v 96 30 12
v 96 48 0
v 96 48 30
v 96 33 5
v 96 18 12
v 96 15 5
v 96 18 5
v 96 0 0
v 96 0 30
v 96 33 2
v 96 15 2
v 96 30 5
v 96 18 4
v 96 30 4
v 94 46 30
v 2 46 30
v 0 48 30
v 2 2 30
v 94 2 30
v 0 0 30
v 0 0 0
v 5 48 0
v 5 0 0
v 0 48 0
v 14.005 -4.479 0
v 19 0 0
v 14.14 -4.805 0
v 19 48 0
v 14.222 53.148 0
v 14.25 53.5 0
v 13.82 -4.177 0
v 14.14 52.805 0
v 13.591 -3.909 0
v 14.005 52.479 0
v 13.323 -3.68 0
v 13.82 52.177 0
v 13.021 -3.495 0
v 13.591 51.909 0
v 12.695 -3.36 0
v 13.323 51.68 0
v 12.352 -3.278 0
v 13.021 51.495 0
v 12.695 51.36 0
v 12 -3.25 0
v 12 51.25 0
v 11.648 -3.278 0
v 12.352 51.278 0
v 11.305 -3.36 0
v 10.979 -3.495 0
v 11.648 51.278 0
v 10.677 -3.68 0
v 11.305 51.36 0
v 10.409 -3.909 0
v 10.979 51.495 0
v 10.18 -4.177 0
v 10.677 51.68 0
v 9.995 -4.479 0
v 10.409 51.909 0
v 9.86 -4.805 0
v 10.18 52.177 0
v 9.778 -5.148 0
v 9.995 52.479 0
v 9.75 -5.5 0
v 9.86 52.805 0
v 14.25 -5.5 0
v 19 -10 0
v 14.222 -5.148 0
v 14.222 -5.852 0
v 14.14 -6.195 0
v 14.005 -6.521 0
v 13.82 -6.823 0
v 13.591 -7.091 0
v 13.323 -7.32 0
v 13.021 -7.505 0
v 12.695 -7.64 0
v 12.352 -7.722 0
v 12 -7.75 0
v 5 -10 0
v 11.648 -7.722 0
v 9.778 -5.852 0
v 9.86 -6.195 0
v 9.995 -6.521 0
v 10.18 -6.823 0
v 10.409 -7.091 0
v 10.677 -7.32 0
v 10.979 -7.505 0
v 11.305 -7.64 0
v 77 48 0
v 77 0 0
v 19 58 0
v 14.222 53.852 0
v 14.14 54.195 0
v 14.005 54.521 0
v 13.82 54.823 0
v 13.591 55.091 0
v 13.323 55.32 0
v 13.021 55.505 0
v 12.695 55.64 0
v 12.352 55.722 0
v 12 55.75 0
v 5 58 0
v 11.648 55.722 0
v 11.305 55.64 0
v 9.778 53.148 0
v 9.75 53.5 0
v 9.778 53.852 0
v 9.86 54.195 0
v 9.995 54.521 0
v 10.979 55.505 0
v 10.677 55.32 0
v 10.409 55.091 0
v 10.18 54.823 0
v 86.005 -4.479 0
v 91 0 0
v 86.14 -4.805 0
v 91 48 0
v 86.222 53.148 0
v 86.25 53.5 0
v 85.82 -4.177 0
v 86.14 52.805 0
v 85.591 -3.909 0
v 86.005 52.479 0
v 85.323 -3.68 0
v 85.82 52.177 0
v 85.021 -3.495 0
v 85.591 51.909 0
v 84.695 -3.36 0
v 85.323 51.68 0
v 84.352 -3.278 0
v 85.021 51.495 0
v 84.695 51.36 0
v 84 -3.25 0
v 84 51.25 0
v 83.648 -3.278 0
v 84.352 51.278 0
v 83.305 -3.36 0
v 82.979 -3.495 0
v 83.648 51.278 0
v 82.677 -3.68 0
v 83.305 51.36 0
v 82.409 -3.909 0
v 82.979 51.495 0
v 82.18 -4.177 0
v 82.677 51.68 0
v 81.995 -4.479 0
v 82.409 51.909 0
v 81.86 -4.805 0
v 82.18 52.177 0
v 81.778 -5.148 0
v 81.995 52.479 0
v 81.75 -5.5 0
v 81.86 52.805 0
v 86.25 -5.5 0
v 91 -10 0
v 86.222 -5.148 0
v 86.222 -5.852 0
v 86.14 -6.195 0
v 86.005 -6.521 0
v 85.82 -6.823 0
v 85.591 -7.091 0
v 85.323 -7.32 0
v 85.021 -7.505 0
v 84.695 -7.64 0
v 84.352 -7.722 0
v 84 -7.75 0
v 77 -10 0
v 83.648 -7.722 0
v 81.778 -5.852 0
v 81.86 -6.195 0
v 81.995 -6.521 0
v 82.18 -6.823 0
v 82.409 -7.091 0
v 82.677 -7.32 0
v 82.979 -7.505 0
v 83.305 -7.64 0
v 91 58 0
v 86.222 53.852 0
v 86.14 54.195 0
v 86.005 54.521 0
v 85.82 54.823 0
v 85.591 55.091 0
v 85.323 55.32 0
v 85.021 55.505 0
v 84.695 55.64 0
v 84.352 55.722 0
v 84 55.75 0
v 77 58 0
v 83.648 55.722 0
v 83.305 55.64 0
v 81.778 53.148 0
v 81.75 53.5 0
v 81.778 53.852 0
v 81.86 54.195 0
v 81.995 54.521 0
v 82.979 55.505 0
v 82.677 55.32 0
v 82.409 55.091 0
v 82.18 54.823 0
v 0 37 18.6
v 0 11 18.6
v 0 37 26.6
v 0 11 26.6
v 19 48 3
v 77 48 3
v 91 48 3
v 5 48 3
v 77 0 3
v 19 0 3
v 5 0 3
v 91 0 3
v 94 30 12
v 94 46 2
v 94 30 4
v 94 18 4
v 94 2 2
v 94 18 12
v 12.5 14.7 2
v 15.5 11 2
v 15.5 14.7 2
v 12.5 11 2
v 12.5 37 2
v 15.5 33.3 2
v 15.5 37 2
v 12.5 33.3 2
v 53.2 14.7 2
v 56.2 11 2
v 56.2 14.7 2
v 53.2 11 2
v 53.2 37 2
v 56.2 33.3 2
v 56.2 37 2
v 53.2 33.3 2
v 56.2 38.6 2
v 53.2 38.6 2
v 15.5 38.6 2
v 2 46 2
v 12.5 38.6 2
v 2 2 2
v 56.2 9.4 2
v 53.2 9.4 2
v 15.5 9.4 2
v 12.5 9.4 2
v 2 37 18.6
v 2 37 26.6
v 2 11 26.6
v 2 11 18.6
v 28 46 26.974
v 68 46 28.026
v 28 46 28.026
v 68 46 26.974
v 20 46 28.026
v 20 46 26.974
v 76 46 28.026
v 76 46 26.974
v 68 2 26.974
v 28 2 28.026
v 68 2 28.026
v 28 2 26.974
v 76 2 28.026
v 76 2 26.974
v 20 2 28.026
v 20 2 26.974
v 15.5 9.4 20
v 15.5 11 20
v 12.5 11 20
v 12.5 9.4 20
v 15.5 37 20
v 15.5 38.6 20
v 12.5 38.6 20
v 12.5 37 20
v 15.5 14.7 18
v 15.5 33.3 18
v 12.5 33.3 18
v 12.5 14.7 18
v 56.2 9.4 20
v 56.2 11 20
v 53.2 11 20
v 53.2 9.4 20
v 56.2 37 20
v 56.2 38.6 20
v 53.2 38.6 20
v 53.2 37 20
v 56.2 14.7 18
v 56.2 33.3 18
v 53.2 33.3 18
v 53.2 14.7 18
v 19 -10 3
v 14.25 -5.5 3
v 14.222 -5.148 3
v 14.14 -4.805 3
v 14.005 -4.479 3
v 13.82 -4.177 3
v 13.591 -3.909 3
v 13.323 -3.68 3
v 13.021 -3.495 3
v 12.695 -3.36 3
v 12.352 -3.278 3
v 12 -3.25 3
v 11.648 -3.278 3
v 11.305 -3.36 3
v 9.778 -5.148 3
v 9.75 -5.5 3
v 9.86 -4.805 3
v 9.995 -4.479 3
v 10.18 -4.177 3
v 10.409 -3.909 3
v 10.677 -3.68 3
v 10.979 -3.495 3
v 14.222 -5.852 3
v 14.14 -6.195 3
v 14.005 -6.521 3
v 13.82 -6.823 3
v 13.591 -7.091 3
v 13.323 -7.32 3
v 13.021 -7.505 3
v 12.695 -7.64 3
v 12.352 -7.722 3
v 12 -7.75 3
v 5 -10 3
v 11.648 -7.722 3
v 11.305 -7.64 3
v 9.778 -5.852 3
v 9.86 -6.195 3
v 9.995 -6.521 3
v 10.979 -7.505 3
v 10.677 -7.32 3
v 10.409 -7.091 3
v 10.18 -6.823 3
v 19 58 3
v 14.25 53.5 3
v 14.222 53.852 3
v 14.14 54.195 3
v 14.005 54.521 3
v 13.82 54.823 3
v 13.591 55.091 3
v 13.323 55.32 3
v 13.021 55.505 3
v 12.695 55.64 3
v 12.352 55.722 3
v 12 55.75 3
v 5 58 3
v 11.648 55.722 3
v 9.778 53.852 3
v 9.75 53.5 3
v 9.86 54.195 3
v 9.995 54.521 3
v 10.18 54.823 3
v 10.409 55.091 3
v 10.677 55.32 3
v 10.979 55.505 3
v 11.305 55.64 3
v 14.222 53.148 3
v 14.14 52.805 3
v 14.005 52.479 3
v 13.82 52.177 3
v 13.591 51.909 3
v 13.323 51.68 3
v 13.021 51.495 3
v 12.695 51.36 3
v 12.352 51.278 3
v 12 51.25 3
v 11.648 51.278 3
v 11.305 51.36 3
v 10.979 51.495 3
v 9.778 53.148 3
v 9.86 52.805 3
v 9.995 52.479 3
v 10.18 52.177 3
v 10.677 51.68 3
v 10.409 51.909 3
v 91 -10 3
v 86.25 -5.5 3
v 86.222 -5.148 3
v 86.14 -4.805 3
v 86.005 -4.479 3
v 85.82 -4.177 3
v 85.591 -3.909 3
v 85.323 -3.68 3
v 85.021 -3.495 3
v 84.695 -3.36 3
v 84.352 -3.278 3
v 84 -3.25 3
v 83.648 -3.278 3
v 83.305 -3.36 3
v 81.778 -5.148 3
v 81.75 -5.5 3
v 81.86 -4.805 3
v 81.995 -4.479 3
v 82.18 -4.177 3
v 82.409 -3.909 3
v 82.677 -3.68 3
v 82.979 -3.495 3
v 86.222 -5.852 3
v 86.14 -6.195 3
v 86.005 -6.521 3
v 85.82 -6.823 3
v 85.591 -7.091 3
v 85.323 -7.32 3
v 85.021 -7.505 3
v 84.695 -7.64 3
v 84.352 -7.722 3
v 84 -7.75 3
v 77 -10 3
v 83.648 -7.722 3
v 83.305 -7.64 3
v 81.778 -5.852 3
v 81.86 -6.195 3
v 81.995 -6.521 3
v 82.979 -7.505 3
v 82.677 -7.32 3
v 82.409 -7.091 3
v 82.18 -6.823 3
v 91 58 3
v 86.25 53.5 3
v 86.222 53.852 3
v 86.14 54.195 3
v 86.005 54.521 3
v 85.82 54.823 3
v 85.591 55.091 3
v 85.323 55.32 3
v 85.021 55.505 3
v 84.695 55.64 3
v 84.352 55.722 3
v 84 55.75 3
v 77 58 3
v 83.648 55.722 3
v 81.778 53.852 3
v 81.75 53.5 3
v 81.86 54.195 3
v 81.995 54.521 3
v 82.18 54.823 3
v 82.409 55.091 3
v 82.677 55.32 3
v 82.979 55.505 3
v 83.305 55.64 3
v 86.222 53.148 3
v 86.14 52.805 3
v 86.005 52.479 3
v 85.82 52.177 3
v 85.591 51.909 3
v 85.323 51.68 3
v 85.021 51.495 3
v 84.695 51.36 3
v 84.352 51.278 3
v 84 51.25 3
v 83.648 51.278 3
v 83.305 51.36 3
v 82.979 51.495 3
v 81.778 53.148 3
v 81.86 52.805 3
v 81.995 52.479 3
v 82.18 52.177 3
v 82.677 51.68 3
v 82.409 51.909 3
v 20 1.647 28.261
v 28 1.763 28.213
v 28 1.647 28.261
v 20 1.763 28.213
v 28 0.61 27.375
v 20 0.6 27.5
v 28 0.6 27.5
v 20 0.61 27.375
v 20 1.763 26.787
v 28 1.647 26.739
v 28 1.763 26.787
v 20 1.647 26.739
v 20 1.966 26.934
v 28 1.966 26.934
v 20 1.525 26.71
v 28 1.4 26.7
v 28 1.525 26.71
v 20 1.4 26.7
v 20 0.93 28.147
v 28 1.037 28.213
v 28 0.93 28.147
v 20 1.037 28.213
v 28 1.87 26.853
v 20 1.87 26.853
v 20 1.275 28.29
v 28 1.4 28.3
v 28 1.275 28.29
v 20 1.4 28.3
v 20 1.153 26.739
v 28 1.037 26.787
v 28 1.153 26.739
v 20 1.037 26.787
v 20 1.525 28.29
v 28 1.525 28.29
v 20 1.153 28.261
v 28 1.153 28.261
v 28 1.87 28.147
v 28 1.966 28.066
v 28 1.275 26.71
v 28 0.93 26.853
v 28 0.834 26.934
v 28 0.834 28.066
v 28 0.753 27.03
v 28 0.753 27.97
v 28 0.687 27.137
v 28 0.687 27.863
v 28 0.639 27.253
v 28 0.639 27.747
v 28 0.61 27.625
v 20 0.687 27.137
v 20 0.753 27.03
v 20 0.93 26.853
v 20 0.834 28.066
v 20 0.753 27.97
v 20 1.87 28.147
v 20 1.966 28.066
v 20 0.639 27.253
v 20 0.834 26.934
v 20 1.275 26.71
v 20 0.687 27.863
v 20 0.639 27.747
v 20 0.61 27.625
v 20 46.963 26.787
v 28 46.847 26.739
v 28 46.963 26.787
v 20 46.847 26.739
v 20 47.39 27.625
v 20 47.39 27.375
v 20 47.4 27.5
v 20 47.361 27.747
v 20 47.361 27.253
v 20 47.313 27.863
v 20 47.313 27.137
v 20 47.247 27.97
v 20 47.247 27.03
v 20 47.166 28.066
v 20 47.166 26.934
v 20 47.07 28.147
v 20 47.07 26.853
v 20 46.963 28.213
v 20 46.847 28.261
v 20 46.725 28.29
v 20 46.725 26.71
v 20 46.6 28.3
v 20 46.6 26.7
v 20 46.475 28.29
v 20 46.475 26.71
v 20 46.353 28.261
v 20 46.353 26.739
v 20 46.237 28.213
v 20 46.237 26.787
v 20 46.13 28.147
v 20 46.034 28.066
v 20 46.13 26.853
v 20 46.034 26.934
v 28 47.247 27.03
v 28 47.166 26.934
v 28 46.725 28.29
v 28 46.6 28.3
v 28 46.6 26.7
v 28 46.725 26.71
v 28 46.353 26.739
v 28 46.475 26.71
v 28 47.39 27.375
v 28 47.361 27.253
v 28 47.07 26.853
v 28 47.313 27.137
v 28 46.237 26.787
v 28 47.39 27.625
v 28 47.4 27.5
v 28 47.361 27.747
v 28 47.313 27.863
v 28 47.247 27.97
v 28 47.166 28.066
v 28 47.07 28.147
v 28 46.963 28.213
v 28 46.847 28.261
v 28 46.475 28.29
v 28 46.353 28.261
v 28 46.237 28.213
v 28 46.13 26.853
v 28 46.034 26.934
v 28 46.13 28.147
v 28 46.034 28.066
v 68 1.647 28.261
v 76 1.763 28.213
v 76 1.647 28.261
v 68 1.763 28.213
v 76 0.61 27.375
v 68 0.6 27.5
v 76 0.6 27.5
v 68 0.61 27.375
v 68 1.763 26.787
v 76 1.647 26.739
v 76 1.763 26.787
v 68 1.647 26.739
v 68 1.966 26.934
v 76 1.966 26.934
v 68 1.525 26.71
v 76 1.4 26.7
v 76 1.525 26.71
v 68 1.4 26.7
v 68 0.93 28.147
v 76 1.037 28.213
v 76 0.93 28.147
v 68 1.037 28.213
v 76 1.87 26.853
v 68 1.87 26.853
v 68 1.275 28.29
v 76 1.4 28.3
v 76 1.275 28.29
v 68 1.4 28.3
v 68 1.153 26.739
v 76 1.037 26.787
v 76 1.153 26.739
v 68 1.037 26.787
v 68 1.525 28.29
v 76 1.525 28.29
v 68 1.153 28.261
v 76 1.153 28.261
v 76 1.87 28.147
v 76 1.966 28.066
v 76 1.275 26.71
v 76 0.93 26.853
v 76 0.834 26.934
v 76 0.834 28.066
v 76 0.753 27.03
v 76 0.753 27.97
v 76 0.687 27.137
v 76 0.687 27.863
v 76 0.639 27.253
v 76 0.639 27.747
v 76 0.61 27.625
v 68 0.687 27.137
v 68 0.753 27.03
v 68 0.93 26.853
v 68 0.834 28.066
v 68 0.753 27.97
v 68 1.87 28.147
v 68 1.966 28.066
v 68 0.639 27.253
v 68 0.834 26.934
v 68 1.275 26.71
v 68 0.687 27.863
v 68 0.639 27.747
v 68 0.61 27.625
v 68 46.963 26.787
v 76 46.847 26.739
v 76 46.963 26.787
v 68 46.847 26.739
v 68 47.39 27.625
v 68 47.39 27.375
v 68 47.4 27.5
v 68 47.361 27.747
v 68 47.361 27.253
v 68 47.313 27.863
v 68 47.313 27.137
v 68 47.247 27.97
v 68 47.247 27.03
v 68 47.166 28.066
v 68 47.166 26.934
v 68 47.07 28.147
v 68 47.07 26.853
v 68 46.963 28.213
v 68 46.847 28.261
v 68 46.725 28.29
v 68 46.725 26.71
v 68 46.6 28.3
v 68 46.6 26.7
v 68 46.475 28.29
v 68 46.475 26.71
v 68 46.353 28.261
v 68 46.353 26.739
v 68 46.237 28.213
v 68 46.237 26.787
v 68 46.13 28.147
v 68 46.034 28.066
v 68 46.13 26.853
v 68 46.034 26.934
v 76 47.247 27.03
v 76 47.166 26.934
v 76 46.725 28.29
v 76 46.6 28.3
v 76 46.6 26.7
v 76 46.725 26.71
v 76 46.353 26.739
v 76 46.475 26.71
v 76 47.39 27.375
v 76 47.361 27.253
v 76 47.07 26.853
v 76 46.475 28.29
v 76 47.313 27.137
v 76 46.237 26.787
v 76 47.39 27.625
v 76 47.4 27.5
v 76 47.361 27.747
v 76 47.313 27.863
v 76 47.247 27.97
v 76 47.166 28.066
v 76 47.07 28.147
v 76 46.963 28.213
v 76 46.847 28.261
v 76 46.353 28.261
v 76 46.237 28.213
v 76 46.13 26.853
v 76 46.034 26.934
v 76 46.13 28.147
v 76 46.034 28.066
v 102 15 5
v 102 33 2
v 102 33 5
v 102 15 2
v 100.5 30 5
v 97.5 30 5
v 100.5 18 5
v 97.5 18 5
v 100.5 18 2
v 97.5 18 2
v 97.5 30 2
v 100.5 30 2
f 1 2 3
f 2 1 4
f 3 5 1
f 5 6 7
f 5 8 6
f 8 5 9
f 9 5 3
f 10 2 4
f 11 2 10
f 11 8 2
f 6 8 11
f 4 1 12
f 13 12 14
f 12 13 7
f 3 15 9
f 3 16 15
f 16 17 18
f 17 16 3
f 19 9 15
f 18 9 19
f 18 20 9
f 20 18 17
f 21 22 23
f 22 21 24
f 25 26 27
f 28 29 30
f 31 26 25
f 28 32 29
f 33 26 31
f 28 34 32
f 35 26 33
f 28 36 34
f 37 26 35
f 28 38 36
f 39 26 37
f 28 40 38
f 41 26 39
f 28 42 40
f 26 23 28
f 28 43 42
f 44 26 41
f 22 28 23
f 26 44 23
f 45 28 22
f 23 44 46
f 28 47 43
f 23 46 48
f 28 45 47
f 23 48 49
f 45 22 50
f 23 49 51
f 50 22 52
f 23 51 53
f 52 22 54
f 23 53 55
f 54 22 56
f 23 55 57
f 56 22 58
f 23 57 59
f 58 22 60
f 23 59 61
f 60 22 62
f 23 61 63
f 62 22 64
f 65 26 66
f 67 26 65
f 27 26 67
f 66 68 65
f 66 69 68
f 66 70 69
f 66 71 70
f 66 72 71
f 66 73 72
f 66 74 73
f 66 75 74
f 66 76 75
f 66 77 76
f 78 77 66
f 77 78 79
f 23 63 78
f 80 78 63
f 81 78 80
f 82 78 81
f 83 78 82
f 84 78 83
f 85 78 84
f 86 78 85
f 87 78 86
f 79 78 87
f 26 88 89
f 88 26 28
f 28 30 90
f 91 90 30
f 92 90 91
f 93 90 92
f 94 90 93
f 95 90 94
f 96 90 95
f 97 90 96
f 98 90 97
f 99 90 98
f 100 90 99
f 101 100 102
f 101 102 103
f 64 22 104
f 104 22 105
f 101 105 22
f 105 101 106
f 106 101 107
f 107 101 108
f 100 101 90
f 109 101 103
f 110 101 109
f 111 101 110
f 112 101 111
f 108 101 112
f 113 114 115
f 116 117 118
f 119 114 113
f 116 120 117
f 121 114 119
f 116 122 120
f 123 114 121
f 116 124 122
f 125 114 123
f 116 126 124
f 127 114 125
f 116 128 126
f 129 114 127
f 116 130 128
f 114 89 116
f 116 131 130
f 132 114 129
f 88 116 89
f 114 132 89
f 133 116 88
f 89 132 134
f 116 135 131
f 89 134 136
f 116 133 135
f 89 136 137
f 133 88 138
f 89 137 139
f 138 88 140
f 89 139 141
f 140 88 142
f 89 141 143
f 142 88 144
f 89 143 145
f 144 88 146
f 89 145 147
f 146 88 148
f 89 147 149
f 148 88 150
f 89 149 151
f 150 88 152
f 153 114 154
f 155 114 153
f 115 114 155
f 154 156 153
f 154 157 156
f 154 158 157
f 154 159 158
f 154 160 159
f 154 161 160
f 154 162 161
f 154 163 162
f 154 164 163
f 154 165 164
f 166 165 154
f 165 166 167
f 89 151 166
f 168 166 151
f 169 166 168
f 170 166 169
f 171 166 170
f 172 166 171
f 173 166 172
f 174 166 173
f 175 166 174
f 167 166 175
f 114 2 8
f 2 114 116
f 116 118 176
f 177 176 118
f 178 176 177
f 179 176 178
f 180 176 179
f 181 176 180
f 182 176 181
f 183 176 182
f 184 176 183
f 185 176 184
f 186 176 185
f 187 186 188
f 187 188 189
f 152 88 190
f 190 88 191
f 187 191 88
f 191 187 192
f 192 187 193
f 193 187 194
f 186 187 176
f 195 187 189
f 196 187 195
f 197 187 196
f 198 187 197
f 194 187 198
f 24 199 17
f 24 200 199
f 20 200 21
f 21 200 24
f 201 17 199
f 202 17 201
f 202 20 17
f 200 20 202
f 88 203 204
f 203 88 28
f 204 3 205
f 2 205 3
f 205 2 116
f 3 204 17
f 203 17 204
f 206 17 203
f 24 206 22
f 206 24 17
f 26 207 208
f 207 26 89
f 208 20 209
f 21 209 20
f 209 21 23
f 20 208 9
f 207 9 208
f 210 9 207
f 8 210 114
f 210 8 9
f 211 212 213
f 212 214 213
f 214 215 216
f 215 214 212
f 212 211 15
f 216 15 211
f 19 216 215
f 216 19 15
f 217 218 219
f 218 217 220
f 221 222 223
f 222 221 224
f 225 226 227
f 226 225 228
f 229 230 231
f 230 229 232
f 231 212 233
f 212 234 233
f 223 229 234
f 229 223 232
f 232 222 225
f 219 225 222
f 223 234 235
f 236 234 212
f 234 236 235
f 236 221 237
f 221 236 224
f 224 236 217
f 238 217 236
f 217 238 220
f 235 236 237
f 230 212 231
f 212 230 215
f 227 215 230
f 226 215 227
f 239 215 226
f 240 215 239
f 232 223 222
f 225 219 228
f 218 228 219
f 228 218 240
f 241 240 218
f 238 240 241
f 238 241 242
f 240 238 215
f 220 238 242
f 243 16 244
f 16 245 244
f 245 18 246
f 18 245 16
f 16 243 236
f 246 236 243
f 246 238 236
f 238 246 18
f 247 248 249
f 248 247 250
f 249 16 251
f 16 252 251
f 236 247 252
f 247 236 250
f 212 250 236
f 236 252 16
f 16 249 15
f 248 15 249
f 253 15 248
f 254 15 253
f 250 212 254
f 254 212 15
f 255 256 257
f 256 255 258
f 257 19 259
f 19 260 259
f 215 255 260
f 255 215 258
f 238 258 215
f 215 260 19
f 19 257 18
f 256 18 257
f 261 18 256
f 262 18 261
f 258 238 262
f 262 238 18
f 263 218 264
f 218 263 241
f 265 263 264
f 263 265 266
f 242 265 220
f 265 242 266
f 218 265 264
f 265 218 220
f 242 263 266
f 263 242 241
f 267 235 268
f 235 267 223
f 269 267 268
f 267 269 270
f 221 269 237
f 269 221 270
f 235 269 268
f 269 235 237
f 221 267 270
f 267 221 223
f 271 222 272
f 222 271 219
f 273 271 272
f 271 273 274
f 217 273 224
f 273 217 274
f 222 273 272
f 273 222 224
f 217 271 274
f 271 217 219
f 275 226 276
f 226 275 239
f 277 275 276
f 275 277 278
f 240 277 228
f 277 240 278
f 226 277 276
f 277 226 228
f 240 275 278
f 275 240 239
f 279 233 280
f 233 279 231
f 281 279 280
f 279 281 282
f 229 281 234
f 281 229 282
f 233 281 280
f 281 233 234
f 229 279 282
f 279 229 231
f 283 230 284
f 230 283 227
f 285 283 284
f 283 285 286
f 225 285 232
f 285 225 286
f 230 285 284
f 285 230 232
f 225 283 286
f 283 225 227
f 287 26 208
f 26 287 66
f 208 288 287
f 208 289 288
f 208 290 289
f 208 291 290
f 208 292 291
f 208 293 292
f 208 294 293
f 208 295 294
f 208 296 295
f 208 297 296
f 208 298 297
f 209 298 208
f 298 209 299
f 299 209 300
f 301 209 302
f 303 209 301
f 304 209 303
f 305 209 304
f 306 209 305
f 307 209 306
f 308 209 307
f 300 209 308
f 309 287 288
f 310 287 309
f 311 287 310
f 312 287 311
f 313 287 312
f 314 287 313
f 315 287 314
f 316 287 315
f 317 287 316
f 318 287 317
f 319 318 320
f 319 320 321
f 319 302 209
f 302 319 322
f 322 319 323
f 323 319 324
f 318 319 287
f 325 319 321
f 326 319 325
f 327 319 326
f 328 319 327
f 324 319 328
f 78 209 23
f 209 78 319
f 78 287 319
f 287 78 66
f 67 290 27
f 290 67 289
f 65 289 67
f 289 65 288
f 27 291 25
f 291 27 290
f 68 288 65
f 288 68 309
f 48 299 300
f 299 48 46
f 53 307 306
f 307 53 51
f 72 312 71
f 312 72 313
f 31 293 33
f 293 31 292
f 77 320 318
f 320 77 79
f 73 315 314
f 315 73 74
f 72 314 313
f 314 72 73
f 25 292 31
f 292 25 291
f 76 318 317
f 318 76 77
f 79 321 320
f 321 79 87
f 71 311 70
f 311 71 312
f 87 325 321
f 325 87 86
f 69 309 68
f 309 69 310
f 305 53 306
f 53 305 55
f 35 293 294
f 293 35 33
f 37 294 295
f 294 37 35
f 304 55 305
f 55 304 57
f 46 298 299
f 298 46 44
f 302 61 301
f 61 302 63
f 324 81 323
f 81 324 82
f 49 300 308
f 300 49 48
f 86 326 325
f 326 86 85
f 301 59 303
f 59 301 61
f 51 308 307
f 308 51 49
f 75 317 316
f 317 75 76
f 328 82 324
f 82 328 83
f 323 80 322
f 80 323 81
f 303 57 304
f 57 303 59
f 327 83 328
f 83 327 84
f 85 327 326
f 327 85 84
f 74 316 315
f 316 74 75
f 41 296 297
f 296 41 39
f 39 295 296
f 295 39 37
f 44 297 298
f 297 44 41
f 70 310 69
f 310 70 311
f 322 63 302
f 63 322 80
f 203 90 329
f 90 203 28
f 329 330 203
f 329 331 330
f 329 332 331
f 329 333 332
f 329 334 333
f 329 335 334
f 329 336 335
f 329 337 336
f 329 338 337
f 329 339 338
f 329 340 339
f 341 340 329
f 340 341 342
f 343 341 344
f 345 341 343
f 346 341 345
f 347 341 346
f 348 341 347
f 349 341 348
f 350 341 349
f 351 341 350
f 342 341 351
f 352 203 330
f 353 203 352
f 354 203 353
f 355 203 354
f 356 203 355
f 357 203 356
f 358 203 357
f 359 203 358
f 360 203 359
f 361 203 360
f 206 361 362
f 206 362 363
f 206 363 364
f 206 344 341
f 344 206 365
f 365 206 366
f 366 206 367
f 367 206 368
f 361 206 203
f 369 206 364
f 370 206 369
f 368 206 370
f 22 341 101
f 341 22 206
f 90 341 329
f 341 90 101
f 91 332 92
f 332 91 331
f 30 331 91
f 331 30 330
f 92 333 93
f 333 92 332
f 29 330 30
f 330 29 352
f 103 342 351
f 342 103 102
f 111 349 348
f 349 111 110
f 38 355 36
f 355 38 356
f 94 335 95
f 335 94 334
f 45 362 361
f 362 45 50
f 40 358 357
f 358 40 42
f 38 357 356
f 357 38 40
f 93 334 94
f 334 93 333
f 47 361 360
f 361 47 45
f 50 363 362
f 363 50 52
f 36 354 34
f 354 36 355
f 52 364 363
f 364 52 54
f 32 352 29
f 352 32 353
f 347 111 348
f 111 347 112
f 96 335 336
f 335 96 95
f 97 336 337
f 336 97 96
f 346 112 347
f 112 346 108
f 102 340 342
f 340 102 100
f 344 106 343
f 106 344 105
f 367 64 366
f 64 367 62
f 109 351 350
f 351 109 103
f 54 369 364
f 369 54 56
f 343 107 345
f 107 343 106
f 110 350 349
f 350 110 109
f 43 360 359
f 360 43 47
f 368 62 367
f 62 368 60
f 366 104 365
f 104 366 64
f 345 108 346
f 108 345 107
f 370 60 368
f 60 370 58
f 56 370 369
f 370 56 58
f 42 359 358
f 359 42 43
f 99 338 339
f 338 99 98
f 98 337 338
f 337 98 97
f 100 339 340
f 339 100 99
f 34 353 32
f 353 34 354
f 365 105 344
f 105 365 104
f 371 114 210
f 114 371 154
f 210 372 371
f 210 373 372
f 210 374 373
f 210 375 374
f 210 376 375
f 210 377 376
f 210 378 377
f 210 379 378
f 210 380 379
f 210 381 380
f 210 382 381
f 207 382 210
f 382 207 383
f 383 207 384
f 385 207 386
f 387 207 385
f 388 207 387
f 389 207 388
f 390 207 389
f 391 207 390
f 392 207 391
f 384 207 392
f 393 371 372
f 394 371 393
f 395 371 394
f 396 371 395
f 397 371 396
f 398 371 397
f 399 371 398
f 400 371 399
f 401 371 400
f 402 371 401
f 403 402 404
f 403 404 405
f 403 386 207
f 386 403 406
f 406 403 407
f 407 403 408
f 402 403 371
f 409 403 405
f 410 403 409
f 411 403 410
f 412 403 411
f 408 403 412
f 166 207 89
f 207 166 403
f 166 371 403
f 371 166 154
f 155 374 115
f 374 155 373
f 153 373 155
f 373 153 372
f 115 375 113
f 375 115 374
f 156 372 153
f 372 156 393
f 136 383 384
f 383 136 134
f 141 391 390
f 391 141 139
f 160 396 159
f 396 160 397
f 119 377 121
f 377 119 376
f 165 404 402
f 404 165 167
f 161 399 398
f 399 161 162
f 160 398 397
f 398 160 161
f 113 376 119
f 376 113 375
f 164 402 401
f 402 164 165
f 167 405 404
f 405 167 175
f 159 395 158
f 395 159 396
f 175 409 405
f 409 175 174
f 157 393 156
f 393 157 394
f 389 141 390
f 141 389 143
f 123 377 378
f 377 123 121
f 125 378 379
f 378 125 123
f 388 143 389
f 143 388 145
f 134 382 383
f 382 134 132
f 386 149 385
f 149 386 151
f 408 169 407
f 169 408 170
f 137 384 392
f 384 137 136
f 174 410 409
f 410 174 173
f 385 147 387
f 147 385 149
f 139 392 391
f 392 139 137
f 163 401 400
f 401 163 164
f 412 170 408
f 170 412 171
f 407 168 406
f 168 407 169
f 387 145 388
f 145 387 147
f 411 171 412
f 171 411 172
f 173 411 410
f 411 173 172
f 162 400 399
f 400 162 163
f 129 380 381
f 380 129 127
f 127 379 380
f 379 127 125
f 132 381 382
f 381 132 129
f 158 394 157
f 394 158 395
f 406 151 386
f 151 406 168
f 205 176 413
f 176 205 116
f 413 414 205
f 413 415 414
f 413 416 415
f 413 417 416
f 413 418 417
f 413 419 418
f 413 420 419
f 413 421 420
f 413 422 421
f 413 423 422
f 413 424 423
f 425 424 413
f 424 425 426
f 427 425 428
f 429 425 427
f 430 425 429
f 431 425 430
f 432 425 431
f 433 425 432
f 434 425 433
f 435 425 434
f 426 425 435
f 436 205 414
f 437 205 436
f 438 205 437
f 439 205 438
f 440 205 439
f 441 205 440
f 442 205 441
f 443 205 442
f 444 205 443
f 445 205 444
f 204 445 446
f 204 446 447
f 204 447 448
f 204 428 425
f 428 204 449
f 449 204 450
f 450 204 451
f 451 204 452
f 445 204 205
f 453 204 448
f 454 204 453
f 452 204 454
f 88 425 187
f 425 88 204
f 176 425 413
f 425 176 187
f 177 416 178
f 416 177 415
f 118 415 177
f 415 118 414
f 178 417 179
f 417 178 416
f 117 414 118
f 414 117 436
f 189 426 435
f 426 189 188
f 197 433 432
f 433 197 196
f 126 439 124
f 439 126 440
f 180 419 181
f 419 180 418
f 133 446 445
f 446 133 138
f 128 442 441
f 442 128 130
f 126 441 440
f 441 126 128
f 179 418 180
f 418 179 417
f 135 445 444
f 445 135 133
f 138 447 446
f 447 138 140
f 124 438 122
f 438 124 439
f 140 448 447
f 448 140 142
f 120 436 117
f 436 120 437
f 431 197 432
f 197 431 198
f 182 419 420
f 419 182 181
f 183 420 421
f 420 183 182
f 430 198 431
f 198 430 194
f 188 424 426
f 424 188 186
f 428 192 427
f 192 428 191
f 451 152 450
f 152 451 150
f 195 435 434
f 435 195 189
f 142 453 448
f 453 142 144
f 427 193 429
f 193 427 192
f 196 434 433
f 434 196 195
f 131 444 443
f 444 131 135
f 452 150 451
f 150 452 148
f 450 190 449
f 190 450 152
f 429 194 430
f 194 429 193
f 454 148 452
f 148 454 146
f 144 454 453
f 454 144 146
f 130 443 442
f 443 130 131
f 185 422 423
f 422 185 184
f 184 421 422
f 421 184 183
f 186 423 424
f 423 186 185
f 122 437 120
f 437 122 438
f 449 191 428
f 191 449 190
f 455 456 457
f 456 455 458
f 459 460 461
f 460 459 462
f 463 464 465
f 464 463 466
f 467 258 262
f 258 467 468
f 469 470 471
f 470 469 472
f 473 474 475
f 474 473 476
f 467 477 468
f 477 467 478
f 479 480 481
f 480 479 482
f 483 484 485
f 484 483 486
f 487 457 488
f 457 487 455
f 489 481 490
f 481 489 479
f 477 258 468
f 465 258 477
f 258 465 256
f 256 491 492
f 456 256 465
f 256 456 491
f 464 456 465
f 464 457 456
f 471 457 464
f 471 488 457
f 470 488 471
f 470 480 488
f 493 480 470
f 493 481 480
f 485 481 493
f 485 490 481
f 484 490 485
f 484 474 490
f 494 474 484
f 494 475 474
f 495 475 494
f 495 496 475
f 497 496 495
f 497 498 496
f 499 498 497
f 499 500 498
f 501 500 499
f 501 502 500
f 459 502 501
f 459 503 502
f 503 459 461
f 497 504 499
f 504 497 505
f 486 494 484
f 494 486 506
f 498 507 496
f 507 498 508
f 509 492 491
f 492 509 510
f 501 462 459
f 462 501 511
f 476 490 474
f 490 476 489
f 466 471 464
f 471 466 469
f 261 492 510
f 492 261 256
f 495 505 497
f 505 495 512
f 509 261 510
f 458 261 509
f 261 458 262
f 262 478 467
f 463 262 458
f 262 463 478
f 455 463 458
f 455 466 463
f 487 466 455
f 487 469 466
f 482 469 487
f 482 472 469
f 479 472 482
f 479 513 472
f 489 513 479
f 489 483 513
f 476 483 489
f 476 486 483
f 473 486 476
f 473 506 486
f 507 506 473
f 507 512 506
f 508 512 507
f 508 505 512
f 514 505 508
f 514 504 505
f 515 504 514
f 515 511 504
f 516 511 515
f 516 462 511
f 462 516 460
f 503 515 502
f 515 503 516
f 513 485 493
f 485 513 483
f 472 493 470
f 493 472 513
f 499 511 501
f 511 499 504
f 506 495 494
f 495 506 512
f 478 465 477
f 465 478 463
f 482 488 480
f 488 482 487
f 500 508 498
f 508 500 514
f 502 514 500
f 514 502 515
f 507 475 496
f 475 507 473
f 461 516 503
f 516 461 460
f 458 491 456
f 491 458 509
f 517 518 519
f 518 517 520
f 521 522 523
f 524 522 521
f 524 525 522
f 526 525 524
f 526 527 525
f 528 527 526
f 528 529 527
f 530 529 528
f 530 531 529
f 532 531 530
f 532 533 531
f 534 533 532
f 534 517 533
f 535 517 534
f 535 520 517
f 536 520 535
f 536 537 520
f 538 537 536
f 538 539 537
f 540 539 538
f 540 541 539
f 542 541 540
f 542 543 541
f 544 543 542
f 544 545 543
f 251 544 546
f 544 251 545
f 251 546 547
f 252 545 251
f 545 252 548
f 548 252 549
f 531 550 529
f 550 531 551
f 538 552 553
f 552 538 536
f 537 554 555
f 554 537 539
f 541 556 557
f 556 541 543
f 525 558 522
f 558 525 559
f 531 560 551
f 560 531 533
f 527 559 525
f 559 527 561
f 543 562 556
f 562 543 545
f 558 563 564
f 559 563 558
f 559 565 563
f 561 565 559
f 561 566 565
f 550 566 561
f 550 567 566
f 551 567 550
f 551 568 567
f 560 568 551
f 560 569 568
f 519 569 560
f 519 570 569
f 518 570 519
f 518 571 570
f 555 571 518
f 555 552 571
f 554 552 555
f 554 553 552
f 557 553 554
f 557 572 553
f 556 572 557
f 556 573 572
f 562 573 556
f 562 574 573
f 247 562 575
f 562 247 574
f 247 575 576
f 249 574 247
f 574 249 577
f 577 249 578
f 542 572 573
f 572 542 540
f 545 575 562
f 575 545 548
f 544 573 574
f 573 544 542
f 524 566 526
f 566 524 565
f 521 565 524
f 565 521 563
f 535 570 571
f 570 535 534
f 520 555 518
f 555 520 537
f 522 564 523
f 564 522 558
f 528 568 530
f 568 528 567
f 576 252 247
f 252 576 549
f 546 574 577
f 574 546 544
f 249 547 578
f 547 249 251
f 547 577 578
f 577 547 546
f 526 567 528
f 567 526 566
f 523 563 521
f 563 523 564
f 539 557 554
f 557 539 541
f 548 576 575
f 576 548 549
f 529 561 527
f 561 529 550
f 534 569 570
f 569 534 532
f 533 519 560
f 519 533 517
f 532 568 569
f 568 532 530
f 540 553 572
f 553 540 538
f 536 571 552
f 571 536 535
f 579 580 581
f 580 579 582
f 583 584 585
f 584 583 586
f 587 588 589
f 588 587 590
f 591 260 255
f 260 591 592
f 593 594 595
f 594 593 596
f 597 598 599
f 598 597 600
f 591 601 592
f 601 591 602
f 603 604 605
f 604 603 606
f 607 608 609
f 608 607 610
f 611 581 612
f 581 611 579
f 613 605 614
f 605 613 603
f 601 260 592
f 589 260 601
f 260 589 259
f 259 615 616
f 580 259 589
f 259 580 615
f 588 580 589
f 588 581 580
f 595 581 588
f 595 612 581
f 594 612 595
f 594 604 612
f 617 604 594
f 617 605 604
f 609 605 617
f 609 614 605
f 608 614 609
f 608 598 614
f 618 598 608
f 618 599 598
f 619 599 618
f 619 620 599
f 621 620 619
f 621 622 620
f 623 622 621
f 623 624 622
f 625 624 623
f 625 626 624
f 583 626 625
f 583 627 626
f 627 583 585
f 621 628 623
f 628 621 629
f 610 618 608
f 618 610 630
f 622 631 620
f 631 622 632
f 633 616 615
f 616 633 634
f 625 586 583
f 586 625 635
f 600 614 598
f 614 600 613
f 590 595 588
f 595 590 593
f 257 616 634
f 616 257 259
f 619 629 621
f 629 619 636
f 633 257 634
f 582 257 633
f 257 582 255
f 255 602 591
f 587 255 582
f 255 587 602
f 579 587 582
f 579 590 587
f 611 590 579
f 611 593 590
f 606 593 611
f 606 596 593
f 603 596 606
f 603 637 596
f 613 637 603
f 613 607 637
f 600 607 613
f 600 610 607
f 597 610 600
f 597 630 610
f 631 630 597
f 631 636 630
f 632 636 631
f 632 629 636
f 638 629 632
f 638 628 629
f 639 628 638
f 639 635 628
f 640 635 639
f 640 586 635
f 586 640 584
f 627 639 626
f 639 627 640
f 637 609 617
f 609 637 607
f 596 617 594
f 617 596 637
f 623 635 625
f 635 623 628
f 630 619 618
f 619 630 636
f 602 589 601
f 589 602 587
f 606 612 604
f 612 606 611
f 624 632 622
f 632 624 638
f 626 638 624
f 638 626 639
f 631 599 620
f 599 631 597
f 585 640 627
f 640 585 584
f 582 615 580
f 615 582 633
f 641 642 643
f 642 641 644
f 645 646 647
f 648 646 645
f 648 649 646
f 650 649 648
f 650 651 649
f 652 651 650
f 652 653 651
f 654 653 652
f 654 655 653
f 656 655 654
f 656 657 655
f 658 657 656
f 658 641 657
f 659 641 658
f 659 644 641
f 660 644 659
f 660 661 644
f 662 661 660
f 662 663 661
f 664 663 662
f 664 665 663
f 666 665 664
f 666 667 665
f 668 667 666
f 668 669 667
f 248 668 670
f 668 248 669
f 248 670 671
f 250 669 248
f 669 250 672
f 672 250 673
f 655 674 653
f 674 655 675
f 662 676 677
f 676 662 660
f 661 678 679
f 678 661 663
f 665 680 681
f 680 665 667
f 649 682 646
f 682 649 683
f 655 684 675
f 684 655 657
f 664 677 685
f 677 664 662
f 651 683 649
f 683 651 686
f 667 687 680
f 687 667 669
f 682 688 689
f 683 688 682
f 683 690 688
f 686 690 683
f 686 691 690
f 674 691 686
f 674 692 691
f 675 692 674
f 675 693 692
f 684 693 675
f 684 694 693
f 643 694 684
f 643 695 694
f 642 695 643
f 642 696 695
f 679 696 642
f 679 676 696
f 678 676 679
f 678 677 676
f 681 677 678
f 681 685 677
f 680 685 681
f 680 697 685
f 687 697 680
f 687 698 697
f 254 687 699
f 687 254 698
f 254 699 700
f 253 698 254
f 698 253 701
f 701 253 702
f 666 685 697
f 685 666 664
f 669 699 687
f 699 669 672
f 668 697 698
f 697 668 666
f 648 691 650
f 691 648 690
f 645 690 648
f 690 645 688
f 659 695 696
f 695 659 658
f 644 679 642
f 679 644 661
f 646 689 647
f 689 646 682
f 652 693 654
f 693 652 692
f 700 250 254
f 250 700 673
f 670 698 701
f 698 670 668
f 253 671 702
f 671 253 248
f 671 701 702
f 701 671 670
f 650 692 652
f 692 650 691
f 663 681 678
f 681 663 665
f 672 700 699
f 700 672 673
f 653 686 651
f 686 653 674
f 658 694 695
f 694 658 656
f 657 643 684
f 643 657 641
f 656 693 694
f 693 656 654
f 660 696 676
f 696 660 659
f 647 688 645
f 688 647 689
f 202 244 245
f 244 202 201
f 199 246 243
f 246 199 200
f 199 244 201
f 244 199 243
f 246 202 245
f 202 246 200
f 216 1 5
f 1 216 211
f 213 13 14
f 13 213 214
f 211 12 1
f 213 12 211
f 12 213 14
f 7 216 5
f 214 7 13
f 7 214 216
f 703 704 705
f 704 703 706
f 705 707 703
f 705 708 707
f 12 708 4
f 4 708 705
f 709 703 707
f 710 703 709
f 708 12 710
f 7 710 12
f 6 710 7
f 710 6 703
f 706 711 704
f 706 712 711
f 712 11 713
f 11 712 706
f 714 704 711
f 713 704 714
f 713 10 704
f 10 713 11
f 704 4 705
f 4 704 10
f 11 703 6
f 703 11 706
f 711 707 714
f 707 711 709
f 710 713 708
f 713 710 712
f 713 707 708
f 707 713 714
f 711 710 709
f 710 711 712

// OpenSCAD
// =====================================================================
//  Minimal tap box (stage 1, drawing KZI-121): holds one
//  ESP32-S3-DevKitC-1 with its pins pointing DOWN onto the 13 tap leads.
//  No PCB, no screws. The board rests on two saddles, two lips locate it
//  sideways, and two fingers on the snap lid hold it down (stick a 1 mm
//  foam pad on each finger if the board rattles).
//
//  openscad -o ../stl/tapbox_min_base.stl -D 'part="base"' tapbox_min.scad
//  openscad -o ../stl/tapbox_min_lid.stl  -D 'part="lid"'  tapbox_min.scad
// =====================================================================

part = "base";            // "base" | "lid" | "assembly"
$fn = 40;

// --- board (DevKitC-1 outline: check the one you buy) [VERIFY] ---
board_l   = 62.7;          // only sets where the fingers land; length is not captured
board_w   = 25.4;
board_t   = 1.6;
hdr_in    = 2.9;           // header + Dupont housing band, measured in from each long edge
under_h   = 16.0;          // room under the board for Dupont housings + wire bend

// --- box ---
L = 96; W = 48; H = 30;    // outer, base only (lid adds 2)
wall = 2.0; floor_t = 2.0;
clr = 0.3;                 // lid fit clearance per side
lid_t = 2.0;

iL = L - 2 * wall; iW = W - 2 * wall;
sup_z = floor_t + under_h;                 // board underside height
bx0   = wall + 2.0;                        // board USB end, 2 mm from the inner wall
cy    = W / 2;

module saddle(x) {
    // centre pad between the two header bands
    pad = board_w - 2 * hdr_in - 1.0;
    translate([x - 1.5, cy - pad / 2, 0]) cube([3, pad, sup_z]);
    // side lips just outside the board edge, 2 mm above the support
    for (s = [-1, 1])
        translate([x - 1.5, cy + s * (board_w / 2 + clr) + (s < 0 ? -1.6 : 0), 0])
            cube([3, 1.6, sup_z + 2.0]);
}

module base() {
    difference() {
        union() {
            difference() {
                cube([L, W, H]);
                translate([wall, wall, floor_t]) cube([iL, iW, H]);
            }
            for (x = [bx0 + 10, bx0 + board_l - 12]) saddle(x);
            // mounting ears for zip ties or M4 screws
            for (x = [12, L - 12]) for (s = [0, 1])
                translate([x - 7, s ? W : -10, 0]) difference() {
                    cube([14, 10, 3]);
                    translate([7, s ? 5.5 : 4.5, -1]) cylinder(d = 4.5, h = 5);
                }
        }
        // USB-C end: both ports of the DevKitC, at board-top height
        translate([-1, cy - 13, sup_z + board_t - 1.0]) cube([wall + 2, 26, 8]);
        // tap harness end (antenna end): 12 x 8 slot near the floor
        translate([L - wall - 1, cy - 6, floor_t + 2]) cube([wall + 2, 12, 8]);
        // snap bumps' sockets for the lid (2 per long side)
        for (x = [L * 0.25, L * 0.75]) for (y = [wall - 0.6, W - wall + 0.6])
            translate([x, y, H - 2.5]) rotate([0, 90, 0]) cylinder(d = 1.6, h = 8, center = true);
    }
    // cable-tie bar outside the harness slot
    translate([L, cy - 9, floor_t]) difference() {
        cube([6, 18, 3]);
        translate([1.5, 3, -1]) cube([3, 12, 5]);
    }
}

module lid() {
    // printed top face down
    cube([L, W, lid_t]);
    lip = 1.2;
    translate([wall + clr, wall + clr, lid_t]) difference() {
        cube([iL - 2 * clr, iW - 2 * clr, 4]);
        translate([lip, lip, -1]) cube([iL - 2 * clr - 2 * lip, iW - 2 * clr - 2 * lip, 6]);
        // clear the USB slot and harness slot
        translate([-1, cy - wall - clr - 13, -1]) cube([lip + 2, 26, 6]);
    }
    // snap bumps
    for (x = [L * 0.25, L * 0.75]) for (y = [wall + clr, W - wall - clr])
        translate([x, y, lid_t + 2.5]) rotate([0, 90, 0]) cylinder(d = 1.2, h = 7, center = true);
    // hold-down fingers: stop 0.5 mm above the board top (about 4 mm of parts on top)
    finger_len = (H - (sup_z + board_t + 4.0)) - 0.5;
    for (x = [bx0 + 10, bx0 + board_l - 12])
        translate([x - 3, cy - 3, lid_t]) cube([6, 6, finger_len]);
}

if (part == "base") base();
else if (part == "lid") lid();
else {
    base();
    color("Green", 0.6) translate([bx0, cy - board_w / 2, sup_z]) cube([board_l, board_w, board_t]);
    color("Gray", 0.4) translate([0, W, H + lid_t]) rotate([180, 0, 0]) lid();
}
